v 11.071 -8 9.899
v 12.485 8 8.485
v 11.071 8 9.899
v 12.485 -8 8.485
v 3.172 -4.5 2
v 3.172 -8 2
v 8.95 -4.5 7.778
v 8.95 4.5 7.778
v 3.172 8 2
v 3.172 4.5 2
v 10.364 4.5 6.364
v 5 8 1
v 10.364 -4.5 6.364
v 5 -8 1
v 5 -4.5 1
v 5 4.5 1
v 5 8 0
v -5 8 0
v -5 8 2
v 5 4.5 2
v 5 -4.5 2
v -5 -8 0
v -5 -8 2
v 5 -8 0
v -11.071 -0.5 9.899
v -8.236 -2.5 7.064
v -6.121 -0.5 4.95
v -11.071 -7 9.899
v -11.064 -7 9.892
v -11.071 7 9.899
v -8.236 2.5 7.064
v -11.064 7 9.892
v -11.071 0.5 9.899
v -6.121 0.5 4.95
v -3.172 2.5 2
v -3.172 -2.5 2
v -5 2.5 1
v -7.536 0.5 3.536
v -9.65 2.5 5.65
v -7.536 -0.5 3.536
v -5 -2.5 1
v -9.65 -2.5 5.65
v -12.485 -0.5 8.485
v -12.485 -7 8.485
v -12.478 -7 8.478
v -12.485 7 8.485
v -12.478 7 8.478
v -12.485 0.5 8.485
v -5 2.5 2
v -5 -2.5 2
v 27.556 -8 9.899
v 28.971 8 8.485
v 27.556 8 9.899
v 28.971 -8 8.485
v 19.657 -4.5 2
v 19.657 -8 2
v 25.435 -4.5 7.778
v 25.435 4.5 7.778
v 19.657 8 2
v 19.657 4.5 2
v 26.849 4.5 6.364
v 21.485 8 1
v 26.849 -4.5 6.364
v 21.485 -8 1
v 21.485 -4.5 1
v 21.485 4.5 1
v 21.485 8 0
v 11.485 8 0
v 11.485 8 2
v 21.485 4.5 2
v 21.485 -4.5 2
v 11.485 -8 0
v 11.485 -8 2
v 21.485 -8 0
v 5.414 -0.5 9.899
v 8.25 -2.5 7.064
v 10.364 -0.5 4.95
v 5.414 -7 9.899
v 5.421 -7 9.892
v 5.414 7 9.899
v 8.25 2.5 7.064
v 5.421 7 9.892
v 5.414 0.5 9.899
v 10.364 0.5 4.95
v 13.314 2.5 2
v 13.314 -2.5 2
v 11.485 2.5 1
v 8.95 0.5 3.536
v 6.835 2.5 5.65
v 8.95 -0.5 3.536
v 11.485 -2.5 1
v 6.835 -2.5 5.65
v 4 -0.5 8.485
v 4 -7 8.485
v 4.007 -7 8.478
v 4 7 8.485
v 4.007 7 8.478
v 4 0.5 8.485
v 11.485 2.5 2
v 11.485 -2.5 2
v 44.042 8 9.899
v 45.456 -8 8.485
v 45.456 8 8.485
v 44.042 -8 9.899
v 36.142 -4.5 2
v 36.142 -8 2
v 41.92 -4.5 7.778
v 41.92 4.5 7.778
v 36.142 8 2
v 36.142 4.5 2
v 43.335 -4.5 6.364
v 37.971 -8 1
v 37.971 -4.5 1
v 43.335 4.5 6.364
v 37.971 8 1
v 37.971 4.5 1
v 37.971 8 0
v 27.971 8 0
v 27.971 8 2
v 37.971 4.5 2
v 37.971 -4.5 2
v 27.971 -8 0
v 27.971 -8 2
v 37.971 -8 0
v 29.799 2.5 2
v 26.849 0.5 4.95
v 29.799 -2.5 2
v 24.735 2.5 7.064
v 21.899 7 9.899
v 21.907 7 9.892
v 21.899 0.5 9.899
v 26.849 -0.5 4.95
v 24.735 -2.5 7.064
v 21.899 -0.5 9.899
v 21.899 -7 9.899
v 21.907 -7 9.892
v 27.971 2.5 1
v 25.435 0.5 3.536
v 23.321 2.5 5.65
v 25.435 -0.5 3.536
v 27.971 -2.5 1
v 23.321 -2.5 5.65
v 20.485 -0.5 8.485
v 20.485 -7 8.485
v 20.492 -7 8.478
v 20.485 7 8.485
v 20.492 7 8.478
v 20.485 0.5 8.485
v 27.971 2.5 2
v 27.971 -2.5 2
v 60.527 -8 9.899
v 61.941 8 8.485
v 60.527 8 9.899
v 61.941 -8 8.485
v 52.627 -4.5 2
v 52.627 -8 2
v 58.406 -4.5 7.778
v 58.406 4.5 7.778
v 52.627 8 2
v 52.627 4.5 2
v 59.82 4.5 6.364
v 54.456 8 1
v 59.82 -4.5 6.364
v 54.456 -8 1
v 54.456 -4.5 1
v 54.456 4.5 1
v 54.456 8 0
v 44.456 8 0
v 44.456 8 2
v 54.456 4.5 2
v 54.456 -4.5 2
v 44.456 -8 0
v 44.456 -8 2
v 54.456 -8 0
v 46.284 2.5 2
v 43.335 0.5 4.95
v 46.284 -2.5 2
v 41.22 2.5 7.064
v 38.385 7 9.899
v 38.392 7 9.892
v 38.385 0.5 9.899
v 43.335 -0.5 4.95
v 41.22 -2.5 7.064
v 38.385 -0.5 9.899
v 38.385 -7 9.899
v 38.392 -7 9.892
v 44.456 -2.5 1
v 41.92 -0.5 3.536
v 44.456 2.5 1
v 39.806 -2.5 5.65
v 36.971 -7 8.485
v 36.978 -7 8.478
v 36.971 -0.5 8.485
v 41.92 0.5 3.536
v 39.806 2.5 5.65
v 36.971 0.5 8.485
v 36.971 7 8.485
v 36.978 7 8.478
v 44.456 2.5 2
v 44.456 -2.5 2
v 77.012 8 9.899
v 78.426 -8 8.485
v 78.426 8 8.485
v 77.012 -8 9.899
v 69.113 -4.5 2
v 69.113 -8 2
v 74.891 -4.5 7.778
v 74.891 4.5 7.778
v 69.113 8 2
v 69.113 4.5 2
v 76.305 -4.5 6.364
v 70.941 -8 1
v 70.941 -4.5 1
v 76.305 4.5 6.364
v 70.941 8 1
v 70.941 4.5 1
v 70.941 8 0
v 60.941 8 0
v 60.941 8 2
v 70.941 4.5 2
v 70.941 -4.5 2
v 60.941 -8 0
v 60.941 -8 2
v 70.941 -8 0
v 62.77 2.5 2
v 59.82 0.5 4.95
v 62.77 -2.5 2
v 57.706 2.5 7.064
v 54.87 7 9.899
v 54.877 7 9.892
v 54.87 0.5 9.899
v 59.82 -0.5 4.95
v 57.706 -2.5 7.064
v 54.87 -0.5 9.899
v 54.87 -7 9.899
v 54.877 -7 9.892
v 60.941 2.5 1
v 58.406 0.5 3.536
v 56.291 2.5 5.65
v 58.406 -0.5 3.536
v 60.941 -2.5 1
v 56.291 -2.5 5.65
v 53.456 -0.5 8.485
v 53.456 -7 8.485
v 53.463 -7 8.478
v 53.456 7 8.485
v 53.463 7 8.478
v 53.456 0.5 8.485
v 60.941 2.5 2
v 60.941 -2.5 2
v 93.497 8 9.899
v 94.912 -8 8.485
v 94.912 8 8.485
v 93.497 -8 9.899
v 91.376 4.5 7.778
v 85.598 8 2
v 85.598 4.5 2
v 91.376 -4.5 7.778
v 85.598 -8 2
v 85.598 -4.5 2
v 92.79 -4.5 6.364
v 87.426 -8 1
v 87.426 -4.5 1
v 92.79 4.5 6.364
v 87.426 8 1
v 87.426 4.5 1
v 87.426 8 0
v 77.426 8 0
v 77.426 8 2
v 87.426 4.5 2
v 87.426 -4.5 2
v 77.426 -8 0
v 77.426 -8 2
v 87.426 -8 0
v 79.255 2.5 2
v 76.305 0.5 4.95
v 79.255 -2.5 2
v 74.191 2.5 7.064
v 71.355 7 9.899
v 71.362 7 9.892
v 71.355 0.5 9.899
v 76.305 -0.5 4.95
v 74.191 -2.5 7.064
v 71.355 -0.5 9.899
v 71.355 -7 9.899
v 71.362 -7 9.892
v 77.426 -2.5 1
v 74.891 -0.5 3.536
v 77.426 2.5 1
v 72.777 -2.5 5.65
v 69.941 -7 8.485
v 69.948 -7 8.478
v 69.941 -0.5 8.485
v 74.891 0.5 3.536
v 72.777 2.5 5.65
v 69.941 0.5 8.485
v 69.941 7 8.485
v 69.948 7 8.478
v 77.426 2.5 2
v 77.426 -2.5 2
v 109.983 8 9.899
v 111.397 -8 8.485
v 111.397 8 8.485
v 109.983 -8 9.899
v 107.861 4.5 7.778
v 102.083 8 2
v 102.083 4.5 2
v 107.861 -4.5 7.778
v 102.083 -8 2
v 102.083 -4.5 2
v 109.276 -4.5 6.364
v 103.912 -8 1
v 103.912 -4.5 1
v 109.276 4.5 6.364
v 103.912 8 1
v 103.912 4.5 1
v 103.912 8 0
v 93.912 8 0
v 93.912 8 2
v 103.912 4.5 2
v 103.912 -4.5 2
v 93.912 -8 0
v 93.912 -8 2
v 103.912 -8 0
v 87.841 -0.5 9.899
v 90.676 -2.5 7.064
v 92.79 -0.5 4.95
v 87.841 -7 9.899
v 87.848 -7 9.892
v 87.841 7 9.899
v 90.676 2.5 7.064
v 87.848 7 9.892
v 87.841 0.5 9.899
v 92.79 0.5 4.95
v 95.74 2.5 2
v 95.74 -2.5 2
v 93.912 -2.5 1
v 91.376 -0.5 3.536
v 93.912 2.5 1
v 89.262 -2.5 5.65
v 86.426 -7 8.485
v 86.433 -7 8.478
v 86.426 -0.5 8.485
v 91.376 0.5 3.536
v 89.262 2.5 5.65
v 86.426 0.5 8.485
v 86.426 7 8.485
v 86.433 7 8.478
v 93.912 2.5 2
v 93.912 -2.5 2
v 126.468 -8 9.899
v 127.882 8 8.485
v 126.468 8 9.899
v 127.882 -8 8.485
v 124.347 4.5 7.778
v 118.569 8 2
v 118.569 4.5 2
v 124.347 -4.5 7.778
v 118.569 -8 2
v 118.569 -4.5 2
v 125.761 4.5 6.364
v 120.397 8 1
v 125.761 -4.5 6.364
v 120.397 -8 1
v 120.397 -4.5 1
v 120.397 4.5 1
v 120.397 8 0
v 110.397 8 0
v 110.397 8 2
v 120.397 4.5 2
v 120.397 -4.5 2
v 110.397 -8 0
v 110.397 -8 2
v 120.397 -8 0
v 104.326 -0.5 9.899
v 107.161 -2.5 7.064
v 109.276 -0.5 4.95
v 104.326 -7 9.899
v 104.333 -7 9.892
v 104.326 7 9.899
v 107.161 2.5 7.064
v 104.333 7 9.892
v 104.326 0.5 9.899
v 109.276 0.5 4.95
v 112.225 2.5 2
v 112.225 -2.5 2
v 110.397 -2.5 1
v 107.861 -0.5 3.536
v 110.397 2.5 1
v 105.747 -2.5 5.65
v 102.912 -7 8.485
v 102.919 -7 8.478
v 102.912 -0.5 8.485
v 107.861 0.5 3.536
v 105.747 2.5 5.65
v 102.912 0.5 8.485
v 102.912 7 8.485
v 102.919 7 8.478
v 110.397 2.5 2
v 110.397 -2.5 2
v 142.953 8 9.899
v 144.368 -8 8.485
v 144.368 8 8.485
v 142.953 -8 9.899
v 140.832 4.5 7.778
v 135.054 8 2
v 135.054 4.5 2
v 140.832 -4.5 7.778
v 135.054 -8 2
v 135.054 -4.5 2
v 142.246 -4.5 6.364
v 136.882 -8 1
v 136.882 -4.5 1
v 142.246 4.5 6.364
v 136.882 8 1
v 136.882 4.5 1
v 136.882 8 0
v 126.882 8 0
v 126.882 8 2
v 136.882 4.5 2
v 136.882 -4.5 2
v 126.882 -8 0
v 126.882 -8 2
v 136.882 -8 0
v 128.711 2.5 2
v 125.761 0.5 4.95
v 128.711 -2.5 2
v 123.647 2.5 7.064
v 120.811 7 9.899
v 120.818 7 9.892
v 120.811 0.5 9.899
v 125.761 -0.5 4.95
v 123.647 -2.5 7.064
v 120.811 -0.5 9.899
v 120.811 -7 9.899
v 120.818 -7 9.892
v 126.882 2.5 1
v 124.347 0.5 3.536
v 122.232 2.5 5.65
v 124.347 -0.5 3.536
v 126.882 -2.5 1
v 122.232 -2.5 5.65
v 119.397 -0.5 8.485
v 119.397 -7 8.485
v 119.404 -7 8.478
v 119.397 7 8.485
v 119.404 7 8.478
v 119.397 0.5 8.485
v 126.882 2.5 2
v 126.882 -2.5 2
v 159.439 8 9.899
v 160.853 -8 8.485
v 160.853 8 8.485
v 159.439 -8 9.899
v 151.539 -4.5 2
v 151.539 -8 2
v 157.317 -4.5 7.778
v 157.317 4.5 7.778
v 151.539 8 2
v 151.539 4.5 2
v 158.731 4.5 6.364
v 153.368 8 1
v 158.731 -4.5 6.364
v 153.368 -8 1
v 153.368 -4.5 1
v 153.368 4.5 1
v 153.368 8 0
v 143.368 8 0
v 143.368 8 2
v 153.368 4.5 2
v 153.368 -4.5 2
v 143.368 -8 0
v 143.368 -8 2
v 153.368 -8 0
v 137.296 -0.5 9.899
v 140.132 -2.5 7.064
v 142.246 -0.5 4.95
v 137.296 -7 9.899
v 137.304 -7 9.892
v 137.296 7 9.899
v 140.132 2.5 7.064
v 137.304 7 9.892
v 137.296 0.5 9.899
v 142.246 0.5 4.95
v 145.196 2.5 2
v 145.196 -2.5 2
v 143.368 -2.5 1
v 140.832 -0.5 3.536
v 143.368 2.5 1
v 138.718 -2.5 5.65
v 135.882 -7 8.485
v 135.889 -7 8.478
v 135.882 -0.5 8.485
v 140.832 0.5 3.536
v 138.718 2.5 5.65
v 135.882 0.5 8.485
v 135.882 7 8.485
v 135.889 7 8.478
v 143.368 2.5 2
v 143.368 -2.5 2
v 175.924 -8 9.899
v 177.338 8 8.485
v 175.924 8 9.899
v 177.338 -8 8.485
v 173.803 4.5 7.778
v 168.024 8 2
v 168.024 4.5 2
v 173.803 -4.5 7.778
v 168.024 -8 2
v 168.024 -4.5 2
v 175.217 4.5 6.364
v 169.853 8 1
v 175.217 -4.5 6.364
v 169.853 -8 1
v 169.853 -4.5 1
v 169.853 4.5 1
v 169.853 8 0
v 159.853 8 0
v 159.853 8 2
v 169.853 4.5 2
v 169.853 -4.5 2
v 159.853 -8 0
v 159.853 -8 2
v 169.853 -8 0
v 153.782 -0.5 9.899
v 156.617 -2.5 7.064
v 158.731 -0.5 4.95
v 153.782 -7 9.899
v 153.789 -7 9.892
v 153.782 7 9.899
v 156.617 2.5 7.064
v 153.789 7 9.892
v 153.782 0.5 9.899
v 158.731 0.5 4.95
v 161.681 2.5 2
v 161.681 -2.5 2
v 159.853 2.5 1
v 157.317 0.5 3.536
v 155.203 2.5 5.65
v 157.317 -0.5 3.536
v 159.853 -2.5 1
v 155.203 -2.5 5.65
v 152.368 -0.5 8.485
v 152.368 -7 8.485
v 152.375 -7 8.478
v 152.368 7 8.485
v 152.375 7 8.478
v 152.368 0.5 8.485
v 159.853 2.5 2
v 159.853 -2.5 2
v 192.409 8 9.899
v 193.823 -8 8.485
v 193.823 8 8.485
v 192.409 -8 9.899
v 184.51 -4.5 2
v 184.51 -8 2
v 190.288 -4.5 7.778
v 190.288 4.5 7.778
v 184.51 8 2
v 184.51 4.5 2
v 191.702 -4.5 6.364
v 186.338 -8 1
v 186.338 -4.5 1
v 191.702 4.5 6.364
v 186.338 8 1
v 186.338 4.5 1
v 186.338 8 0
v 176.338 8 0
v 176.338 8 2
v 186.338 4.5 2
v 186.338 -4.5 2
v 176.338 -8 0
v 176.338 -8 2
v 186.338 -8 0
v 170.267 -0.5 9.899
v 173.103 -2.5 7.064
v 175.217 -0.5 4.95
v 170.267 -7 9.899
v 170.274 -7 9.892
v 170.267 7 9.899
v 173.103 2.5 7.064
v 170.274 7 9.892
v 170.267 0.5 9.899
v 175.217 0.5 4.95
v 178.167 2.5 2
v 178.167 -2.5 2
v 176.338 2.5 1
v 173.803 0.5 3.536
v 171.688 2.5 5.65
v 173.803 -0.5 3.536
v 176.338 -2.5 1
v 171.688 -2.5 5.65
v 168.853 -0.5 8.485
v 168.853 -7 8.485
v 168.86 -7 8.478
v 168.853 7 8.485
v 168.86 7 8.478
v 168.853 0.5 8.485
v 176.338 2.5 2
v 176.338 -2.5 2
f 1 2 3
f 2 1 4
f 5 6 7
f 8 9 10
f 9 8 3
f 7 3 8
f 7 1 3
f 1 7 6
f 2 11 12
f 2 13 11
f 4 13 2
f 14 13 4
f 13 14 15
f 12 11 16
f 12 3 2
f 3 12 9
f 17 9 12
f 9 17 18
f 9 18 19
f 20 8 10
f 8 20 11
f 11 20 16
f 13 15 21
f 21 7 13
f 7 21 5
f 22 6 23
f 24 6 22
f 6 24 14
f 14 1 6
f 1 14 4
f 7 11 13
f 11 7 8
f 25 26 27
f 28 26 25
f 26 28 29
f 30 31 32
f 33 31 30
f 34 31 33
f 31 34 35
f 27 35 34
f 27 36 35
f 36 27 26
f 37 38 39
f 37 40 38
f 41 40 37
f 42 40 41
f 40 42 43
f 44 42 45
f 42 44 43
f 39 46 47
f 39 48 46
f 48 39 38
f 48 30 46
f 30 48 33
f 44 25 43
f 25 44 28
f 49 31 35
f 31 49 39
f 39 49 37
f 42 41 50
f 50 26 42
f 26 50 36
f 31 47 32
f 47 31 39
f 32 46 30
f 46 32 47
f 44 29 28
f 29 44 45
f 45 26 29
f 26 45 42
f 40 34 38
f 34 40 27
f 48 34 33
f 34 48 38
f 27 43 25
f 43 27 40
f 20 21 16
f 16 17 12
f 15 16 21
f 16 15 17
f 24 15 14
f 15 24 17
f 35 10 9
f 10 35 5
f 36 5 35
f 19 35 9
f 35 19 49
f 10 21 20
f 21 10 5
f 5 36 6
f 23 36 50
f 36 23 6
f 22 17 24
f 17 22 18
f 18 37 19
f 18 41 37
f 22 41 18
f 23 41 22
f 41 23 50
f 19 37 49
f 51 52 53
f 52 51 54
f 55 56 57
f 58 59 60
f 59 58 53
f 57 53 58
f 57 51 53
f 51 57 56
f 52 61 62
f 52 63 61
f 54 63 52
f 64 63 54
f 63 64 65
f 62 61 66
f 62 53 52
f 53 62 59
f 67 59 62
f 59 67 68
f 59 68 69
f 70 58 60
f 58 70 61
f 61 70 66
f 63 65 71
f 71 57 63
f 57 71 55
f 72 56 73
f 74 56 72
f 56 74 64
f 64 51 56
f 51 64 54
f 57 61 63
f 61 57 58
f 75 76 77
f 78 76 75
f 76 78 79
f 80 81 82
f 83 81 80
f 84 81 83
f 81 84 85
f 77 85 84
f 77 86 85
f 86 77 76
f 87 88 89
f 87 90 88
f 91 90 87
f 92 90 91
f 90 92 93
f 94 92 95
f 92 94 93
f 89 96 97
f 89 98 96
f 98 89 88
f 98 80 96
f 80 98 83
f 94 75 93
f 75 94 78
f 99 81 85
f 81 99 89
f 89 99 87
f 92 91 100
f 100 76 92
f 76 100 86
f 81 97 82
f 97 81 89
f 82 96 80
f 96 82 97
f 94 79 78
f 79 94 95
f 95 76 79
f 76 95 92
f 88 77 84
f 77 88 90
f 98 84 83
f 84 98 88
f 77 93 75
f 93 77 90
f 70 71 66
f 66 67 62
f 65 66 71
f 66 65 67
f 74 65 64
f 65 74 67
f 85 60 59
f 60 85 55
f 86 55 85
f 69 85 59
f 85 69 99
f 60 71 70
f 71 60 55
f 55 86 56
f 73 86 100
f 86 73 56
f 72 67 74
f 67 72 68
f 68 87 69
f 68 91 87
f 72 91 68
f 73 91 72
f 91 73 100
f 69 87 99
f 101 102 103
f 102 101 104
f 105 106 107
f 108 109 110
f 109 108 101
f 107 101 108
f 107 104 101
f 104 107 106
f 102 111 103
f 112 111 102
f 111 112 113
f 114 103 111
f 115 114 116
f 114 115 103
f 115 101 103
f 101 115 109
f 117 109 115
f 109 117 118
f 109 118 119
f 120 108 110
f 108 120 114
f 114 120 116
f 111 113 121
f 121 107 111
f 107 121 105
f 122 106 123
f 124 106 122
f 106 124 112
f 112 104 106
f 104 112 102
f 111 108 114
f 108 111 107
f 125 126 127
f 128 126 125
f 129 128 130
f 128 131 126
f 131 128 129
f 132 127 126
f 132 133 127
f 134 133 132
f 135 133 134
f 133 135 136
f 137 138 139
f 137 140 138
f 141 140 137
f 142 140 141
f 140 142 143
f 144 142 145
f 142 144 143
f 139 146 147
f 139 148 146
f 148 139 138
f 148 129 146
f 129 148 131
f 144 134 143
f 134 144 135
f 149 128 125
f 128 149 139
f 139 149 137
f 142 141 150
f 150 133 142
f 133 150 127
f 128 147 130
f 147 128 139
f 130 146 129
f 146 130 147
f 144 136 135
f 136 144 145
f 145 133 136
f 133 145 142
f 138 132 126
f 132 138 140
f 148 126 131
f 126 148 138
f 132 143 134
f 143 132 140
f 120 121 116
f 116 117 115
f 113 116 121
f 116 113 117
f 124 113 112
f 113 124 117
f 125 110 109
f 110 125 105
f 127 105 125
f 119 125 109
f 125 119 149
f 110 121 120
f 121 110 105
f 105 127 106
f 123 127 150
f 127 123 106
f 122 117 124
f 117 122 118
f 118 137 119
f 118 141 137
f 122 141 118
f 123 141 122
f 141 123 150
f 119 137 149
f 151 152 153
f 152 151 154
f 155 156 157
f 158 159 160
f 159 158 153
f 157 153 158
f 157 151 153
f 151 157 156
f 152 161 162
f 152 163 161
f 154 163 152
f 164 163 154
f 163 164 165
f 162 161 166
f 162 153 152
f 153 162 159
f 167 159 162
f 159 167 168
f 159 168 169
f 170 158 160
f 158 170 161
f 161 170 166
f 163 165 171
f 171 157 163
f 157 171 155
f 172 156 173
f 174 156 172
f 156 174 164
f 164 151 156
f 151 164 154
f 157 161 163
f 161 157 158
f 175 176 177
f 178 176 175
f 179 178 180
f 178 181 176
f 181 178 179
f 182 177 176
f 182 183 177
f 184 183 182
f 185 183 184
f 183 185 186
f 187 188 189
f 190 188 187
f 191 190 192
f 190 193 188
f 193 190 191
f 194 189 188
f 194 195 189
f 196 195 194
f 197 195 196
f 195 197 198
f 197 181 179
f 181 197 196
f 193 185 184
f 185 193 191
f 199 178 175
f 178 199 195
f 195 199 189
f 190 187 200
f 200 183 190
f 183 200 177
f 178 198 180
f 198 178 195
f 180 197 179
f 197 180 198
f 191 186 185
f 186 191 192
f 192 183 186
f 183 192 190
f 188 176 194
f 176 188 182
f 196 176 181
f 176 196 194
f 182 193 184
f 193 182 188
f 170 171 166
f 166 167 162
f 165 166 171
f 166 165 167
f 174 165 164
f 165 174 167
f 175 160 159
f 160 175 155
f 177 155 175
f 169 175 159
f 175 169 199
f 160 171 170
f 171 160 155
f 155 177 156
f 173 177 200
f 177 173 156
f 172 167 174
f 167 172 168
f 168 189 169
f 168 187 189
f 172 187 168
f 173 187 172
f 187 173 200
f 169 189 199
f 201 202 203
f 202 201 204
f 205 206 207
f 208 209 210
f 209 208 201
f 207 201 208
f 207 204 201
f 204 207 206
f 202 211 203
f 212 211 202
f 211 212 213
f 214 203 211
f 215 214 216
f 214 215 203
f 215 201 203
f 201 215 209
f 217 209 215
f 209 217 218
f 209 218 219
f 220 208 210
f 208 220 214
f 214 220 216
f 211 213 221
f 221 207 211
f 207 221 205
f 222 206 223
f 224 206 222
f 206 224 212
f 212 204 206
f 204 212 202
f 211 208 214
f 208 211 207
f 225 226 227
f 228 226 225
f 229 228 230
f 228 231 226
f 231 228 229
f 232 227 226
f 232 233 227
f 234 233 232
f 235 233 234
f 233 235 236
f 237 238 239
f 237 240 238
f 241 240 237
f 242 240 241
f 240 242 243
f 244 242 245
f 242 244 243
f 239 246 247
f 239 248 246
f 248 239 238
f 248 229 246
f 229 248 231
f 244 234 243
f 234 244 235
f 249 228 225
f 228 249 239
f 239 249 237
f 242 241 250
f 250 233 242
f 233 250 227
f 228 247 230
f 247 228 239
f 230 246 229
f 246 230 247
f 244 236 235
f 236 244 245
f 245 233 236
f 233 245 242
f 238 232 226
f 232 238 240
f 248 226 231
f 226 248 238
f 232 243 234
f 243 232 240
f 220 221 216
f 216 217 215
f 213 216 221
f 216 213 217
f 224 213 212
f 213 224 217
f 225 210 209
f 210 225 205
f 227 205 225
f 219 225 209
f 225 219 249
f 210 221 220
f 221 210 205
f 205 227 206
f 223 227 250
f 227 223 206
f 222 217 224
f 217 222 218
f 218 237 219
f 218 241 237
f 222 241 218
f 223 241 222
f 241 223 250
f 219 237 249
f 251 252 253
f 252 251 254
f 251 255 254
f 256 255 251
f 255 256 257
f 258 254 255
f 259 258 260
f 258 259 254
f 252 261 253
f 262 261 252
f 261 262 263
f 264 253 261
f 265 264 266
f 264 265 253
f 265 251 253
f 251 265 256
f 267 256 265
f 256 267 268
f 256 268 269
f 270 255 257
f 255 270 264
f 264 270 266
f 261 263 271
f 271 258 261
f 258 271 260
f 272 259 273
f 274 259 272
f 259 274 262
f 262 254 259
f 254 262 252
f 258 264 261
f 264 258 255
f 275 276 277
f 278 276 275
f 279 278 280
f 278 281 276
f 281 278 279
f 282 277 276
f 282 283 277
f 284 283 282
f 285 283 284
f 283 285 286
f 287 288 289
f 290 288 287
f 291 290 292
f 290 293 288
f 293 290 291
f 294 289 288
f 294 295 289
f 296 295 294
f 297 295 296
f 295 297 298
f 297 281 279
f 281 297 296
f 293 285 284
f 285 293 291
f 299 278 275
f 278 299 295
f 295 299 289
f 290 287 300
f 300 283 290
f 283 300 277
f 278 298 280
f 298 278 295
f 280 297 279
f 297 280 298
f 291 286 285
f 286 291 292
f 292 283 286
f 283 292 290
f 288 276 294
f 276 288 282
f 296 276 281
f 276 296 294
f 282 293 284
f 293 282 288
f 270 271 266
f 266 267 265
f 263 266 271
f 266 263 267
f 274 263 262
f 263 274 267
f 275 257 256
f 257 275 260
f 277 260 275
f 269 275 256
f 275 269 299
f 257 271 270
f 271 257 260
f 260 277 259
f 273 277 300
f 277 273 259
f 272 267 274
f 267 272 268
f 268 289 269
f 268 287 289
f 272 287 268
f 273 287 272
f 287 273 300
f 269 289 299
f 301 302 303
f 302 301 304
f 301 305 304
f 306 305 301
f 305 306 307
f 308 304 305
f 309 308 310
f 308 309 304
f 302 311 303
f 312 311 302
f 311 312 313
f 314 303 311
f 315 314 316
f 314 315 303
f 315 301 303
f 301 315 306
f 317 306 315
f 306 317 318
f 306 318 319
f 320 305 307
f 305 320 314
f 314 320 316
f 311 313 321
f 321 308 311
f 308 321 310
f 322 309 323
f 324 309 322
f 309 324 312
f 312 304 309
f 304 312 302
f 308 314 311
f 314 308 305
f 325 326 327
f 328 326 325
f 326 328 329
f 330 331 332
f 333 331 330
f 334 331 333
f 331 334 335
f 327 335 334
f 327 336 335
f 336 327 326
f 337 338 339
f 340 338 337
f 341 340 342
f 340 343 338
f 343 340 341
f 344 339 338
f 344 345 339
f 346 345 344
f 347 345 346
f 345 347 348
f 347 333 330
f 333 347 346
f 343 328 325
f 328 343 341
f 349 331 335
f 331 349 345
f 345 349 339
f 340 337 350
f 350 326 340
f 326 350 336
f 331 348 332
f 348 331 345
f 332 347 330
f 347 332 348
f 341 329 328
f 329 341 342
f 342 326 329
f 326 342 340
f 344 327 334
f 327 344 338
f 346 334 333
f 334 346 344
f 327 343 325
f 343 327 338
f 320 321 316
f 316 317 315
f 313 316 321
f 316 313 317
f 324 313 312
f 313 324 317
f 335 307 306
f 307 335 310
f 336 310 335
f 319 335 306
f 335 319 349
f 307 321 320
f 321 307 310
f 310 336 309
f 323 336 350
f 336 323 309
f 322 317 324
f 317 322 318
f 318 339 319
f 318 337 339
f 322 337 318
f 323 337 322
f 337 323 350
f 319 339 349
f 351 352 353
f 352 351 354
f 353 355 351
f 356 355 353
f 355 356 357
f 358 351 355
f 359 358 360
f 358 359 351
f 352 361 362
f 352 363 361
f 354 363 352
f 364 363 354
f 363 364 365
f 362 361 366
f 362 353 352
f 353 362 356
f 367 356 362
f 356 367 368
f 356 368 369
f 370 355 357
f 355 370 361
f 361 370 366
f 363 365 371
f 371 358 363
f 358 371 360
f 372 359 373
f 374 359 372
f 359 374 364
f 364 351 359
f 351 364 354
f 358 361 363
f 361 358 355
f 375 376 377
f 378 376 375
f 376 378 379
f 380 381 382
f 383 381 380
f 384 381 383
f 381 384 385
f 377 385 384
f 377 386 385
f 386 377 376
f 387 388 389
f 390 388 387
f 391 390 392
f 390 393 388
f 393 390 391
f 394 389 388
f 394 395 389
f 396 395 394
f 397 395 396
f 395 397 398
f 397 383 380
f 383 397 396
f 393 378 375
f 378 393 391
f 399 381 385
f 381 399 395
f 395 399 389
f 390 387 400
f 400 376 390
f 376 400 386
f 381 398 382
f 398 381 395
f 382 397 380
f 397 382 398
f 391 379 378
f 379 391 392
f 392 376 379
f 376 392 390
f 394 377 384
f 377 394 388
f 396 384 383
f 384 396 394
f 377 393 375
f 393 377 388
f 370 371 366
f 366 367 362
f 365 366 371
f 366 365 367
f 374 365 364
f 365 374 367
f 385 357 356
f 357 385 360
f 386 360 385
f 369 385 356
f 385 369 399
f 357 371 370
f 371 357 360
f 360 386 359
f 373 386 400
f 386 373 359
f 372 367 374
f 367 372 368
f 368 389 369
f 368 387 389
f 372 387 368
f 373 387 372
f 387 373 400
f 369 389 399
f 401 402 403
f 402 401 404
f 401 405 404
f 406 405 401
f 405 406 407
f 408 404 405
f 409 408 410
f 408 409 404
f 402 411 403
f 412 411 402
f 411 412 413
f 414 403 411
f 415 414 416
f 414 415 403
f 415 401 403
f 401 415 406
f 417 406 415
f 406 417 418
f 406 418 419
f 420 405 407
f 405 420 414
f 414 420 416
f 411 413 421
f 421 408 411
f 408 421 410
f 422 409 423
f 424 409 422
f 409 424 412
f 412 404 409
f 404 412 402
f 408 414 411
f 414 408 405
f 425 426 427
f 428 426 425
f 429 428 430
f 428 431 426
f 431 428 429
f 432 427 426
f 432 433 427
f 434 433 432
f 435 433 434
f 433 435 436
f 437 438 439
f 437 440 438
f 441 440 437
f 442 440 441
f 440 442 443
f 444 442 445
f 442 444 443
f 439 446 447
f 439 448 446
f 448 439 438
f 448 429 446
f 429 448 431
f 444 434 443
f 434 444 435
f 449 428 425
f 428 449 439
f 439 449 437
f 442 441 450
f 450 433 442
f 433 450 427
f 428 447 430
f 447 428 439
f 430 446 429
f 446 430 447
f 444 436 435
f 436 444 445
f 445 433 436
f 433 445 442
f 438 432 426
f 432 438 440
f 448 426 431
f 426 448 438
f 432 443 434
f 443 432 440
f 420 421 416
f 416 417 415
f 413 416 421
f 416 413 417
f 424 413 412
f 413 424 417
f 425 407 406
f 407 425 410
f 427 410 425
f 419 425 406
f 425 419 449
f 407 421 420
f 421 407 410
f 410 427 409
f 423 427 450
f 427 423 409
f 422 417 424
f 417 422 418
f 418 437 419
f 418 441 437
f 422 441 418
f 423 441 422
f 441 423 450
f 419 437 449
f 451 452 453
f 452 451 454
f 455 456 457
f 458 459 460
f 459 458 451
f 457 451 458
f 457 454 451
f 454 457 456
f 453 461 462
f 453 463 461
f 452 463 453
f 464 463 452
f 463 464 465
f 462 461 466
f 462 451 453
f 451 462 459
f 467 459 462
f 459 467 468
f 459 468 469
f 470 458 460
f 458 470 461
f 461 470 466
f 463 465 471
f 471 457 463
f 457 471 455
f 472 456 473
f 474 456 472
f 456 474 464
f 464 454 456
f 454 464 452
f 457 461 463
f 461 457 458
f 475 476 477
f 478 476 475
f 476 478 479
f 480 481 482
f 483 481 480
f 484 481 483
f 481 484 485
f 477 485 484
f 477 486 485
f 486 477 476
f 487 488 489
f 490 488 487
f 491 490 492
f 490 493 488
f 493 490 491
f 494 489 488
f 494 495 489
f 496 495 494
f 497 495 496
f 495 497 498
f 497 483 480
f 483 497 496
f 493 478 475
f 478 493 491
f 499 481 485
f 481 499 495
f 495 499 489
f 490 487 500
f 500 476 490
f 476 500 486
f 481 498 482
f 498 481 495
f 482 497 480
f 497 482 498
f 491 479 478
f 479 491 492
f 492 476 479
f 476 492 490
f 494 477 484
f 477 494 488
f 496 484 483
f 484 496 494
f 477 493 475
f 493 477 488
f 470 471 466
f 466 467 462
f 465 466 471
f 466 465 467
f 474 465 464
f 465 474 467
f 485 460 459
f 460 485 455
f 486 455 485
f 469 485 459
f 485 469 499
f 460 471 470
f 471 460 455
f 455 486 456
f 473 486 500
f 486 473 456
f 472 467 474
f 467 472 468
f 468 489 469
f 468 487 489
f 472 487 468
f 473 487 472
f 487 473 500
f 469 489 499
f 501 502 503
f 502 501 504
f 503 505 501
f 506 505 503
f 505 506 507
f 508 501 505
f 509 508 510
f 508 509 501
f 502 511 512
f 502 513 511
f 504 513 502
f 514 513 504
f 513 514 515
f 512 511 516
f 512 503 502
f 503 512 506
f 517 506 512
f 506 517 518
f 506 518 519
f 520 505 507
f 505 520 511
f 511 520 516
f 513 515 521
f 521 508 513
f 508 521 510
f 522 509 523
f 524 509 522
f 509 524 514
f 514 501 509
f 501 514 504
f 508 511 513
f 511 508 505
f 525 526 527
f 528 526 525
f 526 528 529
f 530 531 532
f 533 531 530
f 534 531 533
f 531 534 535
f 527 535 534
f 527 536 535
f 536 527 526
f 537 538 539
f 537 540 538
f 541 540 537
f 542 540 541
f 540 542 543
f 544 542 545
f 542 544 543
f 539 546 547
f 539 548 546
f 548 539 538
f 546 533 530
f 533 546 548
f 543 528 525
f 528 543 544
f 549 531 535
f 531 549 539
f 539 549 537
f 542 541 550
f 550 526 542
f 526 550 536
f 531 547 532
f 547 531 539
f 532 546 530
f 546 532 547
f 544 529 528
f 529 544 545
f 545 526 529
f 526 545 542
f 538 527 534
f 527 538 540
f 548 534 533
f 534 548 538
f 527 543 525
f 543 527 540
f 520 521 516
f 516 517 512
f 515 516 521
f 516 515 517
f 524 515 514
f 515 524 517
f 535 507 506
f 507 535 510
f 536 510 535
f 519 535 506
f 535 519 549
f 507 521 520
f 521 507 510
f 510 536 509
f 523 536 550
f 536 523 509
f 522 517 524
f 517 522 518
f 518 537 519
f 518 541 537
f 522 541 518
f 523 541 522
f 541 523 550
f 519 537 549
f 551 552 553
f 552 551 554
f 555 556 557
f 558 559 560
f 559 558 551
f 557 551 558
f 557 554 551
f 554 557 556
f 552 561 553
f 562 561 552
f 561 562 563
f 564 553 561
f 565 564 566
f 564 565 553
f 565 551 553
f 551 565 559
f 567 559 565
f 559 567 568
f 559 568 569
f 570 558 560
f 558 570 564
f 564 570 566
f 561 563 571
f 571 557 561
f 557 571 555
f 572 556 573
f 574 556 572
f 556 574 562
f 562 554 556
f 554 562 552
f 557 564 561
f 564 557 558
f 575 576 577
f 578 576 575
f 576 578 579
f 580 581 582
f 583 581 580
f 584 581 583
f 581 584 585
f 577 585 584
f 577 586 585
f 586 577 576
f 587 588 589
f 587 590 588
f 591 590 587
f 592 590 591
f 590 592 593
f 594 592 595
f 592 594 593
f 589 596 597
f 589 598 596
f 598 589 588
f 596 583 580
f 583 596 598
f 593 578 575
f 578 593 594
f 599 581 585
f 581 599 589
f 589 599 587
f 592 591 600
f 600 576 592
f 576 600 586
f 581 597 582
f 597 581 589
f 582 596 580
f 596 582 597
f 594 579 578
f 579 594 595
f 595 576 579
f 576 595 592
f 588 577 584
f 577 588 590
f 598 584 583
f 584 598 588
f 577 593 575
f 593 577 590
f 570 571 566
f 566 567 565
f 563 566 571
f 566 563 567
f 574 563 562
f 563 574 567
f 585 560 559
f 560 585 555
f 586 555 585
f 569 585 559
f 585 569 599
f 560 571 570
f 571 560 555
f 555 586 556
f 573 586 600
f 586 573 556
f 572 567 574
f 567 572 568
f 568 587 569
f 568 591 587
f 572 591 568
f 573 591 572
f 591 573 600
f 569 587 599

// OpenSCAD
/* 
   Parametric Interlocking Wristband
   Print-in-place, flexible chain 
*/

$fn = 32;

// --- Parameters ---

// Number of links in the wristband (12-14 is usually good for adults)
num_links = 12;

// Base Dimensions
flat_length = 10;
width = 16;
thickness = 2;

// Arm Dimensions
arm_length = 12;
angle = 45;

// Joint Dimensions
rail_width = 3.5;           // Width of the loop sides
pillar_width = 5;           // Width of the center stick (leaves 2mm clearance on each side)
arrow_max_width = 14;       // Width of the catch to prevent it from pulling out
arrow_length = 4;           // Length of the arrowhead triangle
loop_crossbar_length = 3;   // The bar that closes the loop

// Overlap for strength at the joint where arm meets the flat base
inset = 1;

// --- Math & Positioning ---
right_pivot = flat_length/2 - inset;
left_pivot = -flat_length/2 + inset;

// The exact distance required so the 45-degree arms cross perfectly in their center
pitch = (right_pivot - left_pivot) + arm_length * cos(angle);


// --- Assembly ---
// Generate the fully interlocked print-in-place chain
for (i = [0 : num_links - 1]) {
    translate([i * pitch, 0, 0])
        link();
}


// --- Modules ---
module link() {
    // 1. Flat Base Plate
    translate([-flat_length/2, -width/2, 0])
        cube([flat_length, width, thickness]);

    // 2. Right Arm (Female Loop) - Extends Up and Right
    translate([right_pivot, 0, 0])
        rotate([0, -angle, 0]) {
            // Front Rail
            translate([0, width/2 - rail_width, 0])
                cube([arm_length, rail_width, thickness]);
            // Back Rail
            translate([0, -width/2, 0])
                cube([arm_length, rail_width, thickness]);
            // Top Closing Crossbar
            translate([arm_length - loop_crossbar_length, -width/2, 0])
                cube([loop_crossbar_length, width, thickness]);
        }

    // 3. Left Arm (Male Arrowhead) - Extends Up and Left
    // Drawn facing left (-X), then rotated UP (+45)
    translate([left_pivot, 0, 0])
        rotate([0, angle, 0]) {
            difference() {
                union() {
                    // Central Pillar
                    translate([-arm_length, -pillar_width/2, 0])
                        cube([arm_length, pillar_width, thickness]);
                    
                    // Arrowhead Catch (Chamfered so it prints easily without supports)
                    hull() {
                        translate([-arm_length, -arrow_max_width/2, 0])
                            cube([0.01, arrow_max_width, thickness]);
                        translate([-arm_length + arrow_length, -pillar_width/2, 0])
                            cube([0.01, pillar_width, thickness]);
                    }
                }
                
                // Compression slit (Allows the user to snap the ends together to close the wristband)
                slit_width = 1;
                slit_length = arrow_length + 3;
                translate([-arm_length - 1, -slit_width/2, -1])
                    cube([slit_length + 1, slit_width, thickness + 2]);
            }
        }
}
